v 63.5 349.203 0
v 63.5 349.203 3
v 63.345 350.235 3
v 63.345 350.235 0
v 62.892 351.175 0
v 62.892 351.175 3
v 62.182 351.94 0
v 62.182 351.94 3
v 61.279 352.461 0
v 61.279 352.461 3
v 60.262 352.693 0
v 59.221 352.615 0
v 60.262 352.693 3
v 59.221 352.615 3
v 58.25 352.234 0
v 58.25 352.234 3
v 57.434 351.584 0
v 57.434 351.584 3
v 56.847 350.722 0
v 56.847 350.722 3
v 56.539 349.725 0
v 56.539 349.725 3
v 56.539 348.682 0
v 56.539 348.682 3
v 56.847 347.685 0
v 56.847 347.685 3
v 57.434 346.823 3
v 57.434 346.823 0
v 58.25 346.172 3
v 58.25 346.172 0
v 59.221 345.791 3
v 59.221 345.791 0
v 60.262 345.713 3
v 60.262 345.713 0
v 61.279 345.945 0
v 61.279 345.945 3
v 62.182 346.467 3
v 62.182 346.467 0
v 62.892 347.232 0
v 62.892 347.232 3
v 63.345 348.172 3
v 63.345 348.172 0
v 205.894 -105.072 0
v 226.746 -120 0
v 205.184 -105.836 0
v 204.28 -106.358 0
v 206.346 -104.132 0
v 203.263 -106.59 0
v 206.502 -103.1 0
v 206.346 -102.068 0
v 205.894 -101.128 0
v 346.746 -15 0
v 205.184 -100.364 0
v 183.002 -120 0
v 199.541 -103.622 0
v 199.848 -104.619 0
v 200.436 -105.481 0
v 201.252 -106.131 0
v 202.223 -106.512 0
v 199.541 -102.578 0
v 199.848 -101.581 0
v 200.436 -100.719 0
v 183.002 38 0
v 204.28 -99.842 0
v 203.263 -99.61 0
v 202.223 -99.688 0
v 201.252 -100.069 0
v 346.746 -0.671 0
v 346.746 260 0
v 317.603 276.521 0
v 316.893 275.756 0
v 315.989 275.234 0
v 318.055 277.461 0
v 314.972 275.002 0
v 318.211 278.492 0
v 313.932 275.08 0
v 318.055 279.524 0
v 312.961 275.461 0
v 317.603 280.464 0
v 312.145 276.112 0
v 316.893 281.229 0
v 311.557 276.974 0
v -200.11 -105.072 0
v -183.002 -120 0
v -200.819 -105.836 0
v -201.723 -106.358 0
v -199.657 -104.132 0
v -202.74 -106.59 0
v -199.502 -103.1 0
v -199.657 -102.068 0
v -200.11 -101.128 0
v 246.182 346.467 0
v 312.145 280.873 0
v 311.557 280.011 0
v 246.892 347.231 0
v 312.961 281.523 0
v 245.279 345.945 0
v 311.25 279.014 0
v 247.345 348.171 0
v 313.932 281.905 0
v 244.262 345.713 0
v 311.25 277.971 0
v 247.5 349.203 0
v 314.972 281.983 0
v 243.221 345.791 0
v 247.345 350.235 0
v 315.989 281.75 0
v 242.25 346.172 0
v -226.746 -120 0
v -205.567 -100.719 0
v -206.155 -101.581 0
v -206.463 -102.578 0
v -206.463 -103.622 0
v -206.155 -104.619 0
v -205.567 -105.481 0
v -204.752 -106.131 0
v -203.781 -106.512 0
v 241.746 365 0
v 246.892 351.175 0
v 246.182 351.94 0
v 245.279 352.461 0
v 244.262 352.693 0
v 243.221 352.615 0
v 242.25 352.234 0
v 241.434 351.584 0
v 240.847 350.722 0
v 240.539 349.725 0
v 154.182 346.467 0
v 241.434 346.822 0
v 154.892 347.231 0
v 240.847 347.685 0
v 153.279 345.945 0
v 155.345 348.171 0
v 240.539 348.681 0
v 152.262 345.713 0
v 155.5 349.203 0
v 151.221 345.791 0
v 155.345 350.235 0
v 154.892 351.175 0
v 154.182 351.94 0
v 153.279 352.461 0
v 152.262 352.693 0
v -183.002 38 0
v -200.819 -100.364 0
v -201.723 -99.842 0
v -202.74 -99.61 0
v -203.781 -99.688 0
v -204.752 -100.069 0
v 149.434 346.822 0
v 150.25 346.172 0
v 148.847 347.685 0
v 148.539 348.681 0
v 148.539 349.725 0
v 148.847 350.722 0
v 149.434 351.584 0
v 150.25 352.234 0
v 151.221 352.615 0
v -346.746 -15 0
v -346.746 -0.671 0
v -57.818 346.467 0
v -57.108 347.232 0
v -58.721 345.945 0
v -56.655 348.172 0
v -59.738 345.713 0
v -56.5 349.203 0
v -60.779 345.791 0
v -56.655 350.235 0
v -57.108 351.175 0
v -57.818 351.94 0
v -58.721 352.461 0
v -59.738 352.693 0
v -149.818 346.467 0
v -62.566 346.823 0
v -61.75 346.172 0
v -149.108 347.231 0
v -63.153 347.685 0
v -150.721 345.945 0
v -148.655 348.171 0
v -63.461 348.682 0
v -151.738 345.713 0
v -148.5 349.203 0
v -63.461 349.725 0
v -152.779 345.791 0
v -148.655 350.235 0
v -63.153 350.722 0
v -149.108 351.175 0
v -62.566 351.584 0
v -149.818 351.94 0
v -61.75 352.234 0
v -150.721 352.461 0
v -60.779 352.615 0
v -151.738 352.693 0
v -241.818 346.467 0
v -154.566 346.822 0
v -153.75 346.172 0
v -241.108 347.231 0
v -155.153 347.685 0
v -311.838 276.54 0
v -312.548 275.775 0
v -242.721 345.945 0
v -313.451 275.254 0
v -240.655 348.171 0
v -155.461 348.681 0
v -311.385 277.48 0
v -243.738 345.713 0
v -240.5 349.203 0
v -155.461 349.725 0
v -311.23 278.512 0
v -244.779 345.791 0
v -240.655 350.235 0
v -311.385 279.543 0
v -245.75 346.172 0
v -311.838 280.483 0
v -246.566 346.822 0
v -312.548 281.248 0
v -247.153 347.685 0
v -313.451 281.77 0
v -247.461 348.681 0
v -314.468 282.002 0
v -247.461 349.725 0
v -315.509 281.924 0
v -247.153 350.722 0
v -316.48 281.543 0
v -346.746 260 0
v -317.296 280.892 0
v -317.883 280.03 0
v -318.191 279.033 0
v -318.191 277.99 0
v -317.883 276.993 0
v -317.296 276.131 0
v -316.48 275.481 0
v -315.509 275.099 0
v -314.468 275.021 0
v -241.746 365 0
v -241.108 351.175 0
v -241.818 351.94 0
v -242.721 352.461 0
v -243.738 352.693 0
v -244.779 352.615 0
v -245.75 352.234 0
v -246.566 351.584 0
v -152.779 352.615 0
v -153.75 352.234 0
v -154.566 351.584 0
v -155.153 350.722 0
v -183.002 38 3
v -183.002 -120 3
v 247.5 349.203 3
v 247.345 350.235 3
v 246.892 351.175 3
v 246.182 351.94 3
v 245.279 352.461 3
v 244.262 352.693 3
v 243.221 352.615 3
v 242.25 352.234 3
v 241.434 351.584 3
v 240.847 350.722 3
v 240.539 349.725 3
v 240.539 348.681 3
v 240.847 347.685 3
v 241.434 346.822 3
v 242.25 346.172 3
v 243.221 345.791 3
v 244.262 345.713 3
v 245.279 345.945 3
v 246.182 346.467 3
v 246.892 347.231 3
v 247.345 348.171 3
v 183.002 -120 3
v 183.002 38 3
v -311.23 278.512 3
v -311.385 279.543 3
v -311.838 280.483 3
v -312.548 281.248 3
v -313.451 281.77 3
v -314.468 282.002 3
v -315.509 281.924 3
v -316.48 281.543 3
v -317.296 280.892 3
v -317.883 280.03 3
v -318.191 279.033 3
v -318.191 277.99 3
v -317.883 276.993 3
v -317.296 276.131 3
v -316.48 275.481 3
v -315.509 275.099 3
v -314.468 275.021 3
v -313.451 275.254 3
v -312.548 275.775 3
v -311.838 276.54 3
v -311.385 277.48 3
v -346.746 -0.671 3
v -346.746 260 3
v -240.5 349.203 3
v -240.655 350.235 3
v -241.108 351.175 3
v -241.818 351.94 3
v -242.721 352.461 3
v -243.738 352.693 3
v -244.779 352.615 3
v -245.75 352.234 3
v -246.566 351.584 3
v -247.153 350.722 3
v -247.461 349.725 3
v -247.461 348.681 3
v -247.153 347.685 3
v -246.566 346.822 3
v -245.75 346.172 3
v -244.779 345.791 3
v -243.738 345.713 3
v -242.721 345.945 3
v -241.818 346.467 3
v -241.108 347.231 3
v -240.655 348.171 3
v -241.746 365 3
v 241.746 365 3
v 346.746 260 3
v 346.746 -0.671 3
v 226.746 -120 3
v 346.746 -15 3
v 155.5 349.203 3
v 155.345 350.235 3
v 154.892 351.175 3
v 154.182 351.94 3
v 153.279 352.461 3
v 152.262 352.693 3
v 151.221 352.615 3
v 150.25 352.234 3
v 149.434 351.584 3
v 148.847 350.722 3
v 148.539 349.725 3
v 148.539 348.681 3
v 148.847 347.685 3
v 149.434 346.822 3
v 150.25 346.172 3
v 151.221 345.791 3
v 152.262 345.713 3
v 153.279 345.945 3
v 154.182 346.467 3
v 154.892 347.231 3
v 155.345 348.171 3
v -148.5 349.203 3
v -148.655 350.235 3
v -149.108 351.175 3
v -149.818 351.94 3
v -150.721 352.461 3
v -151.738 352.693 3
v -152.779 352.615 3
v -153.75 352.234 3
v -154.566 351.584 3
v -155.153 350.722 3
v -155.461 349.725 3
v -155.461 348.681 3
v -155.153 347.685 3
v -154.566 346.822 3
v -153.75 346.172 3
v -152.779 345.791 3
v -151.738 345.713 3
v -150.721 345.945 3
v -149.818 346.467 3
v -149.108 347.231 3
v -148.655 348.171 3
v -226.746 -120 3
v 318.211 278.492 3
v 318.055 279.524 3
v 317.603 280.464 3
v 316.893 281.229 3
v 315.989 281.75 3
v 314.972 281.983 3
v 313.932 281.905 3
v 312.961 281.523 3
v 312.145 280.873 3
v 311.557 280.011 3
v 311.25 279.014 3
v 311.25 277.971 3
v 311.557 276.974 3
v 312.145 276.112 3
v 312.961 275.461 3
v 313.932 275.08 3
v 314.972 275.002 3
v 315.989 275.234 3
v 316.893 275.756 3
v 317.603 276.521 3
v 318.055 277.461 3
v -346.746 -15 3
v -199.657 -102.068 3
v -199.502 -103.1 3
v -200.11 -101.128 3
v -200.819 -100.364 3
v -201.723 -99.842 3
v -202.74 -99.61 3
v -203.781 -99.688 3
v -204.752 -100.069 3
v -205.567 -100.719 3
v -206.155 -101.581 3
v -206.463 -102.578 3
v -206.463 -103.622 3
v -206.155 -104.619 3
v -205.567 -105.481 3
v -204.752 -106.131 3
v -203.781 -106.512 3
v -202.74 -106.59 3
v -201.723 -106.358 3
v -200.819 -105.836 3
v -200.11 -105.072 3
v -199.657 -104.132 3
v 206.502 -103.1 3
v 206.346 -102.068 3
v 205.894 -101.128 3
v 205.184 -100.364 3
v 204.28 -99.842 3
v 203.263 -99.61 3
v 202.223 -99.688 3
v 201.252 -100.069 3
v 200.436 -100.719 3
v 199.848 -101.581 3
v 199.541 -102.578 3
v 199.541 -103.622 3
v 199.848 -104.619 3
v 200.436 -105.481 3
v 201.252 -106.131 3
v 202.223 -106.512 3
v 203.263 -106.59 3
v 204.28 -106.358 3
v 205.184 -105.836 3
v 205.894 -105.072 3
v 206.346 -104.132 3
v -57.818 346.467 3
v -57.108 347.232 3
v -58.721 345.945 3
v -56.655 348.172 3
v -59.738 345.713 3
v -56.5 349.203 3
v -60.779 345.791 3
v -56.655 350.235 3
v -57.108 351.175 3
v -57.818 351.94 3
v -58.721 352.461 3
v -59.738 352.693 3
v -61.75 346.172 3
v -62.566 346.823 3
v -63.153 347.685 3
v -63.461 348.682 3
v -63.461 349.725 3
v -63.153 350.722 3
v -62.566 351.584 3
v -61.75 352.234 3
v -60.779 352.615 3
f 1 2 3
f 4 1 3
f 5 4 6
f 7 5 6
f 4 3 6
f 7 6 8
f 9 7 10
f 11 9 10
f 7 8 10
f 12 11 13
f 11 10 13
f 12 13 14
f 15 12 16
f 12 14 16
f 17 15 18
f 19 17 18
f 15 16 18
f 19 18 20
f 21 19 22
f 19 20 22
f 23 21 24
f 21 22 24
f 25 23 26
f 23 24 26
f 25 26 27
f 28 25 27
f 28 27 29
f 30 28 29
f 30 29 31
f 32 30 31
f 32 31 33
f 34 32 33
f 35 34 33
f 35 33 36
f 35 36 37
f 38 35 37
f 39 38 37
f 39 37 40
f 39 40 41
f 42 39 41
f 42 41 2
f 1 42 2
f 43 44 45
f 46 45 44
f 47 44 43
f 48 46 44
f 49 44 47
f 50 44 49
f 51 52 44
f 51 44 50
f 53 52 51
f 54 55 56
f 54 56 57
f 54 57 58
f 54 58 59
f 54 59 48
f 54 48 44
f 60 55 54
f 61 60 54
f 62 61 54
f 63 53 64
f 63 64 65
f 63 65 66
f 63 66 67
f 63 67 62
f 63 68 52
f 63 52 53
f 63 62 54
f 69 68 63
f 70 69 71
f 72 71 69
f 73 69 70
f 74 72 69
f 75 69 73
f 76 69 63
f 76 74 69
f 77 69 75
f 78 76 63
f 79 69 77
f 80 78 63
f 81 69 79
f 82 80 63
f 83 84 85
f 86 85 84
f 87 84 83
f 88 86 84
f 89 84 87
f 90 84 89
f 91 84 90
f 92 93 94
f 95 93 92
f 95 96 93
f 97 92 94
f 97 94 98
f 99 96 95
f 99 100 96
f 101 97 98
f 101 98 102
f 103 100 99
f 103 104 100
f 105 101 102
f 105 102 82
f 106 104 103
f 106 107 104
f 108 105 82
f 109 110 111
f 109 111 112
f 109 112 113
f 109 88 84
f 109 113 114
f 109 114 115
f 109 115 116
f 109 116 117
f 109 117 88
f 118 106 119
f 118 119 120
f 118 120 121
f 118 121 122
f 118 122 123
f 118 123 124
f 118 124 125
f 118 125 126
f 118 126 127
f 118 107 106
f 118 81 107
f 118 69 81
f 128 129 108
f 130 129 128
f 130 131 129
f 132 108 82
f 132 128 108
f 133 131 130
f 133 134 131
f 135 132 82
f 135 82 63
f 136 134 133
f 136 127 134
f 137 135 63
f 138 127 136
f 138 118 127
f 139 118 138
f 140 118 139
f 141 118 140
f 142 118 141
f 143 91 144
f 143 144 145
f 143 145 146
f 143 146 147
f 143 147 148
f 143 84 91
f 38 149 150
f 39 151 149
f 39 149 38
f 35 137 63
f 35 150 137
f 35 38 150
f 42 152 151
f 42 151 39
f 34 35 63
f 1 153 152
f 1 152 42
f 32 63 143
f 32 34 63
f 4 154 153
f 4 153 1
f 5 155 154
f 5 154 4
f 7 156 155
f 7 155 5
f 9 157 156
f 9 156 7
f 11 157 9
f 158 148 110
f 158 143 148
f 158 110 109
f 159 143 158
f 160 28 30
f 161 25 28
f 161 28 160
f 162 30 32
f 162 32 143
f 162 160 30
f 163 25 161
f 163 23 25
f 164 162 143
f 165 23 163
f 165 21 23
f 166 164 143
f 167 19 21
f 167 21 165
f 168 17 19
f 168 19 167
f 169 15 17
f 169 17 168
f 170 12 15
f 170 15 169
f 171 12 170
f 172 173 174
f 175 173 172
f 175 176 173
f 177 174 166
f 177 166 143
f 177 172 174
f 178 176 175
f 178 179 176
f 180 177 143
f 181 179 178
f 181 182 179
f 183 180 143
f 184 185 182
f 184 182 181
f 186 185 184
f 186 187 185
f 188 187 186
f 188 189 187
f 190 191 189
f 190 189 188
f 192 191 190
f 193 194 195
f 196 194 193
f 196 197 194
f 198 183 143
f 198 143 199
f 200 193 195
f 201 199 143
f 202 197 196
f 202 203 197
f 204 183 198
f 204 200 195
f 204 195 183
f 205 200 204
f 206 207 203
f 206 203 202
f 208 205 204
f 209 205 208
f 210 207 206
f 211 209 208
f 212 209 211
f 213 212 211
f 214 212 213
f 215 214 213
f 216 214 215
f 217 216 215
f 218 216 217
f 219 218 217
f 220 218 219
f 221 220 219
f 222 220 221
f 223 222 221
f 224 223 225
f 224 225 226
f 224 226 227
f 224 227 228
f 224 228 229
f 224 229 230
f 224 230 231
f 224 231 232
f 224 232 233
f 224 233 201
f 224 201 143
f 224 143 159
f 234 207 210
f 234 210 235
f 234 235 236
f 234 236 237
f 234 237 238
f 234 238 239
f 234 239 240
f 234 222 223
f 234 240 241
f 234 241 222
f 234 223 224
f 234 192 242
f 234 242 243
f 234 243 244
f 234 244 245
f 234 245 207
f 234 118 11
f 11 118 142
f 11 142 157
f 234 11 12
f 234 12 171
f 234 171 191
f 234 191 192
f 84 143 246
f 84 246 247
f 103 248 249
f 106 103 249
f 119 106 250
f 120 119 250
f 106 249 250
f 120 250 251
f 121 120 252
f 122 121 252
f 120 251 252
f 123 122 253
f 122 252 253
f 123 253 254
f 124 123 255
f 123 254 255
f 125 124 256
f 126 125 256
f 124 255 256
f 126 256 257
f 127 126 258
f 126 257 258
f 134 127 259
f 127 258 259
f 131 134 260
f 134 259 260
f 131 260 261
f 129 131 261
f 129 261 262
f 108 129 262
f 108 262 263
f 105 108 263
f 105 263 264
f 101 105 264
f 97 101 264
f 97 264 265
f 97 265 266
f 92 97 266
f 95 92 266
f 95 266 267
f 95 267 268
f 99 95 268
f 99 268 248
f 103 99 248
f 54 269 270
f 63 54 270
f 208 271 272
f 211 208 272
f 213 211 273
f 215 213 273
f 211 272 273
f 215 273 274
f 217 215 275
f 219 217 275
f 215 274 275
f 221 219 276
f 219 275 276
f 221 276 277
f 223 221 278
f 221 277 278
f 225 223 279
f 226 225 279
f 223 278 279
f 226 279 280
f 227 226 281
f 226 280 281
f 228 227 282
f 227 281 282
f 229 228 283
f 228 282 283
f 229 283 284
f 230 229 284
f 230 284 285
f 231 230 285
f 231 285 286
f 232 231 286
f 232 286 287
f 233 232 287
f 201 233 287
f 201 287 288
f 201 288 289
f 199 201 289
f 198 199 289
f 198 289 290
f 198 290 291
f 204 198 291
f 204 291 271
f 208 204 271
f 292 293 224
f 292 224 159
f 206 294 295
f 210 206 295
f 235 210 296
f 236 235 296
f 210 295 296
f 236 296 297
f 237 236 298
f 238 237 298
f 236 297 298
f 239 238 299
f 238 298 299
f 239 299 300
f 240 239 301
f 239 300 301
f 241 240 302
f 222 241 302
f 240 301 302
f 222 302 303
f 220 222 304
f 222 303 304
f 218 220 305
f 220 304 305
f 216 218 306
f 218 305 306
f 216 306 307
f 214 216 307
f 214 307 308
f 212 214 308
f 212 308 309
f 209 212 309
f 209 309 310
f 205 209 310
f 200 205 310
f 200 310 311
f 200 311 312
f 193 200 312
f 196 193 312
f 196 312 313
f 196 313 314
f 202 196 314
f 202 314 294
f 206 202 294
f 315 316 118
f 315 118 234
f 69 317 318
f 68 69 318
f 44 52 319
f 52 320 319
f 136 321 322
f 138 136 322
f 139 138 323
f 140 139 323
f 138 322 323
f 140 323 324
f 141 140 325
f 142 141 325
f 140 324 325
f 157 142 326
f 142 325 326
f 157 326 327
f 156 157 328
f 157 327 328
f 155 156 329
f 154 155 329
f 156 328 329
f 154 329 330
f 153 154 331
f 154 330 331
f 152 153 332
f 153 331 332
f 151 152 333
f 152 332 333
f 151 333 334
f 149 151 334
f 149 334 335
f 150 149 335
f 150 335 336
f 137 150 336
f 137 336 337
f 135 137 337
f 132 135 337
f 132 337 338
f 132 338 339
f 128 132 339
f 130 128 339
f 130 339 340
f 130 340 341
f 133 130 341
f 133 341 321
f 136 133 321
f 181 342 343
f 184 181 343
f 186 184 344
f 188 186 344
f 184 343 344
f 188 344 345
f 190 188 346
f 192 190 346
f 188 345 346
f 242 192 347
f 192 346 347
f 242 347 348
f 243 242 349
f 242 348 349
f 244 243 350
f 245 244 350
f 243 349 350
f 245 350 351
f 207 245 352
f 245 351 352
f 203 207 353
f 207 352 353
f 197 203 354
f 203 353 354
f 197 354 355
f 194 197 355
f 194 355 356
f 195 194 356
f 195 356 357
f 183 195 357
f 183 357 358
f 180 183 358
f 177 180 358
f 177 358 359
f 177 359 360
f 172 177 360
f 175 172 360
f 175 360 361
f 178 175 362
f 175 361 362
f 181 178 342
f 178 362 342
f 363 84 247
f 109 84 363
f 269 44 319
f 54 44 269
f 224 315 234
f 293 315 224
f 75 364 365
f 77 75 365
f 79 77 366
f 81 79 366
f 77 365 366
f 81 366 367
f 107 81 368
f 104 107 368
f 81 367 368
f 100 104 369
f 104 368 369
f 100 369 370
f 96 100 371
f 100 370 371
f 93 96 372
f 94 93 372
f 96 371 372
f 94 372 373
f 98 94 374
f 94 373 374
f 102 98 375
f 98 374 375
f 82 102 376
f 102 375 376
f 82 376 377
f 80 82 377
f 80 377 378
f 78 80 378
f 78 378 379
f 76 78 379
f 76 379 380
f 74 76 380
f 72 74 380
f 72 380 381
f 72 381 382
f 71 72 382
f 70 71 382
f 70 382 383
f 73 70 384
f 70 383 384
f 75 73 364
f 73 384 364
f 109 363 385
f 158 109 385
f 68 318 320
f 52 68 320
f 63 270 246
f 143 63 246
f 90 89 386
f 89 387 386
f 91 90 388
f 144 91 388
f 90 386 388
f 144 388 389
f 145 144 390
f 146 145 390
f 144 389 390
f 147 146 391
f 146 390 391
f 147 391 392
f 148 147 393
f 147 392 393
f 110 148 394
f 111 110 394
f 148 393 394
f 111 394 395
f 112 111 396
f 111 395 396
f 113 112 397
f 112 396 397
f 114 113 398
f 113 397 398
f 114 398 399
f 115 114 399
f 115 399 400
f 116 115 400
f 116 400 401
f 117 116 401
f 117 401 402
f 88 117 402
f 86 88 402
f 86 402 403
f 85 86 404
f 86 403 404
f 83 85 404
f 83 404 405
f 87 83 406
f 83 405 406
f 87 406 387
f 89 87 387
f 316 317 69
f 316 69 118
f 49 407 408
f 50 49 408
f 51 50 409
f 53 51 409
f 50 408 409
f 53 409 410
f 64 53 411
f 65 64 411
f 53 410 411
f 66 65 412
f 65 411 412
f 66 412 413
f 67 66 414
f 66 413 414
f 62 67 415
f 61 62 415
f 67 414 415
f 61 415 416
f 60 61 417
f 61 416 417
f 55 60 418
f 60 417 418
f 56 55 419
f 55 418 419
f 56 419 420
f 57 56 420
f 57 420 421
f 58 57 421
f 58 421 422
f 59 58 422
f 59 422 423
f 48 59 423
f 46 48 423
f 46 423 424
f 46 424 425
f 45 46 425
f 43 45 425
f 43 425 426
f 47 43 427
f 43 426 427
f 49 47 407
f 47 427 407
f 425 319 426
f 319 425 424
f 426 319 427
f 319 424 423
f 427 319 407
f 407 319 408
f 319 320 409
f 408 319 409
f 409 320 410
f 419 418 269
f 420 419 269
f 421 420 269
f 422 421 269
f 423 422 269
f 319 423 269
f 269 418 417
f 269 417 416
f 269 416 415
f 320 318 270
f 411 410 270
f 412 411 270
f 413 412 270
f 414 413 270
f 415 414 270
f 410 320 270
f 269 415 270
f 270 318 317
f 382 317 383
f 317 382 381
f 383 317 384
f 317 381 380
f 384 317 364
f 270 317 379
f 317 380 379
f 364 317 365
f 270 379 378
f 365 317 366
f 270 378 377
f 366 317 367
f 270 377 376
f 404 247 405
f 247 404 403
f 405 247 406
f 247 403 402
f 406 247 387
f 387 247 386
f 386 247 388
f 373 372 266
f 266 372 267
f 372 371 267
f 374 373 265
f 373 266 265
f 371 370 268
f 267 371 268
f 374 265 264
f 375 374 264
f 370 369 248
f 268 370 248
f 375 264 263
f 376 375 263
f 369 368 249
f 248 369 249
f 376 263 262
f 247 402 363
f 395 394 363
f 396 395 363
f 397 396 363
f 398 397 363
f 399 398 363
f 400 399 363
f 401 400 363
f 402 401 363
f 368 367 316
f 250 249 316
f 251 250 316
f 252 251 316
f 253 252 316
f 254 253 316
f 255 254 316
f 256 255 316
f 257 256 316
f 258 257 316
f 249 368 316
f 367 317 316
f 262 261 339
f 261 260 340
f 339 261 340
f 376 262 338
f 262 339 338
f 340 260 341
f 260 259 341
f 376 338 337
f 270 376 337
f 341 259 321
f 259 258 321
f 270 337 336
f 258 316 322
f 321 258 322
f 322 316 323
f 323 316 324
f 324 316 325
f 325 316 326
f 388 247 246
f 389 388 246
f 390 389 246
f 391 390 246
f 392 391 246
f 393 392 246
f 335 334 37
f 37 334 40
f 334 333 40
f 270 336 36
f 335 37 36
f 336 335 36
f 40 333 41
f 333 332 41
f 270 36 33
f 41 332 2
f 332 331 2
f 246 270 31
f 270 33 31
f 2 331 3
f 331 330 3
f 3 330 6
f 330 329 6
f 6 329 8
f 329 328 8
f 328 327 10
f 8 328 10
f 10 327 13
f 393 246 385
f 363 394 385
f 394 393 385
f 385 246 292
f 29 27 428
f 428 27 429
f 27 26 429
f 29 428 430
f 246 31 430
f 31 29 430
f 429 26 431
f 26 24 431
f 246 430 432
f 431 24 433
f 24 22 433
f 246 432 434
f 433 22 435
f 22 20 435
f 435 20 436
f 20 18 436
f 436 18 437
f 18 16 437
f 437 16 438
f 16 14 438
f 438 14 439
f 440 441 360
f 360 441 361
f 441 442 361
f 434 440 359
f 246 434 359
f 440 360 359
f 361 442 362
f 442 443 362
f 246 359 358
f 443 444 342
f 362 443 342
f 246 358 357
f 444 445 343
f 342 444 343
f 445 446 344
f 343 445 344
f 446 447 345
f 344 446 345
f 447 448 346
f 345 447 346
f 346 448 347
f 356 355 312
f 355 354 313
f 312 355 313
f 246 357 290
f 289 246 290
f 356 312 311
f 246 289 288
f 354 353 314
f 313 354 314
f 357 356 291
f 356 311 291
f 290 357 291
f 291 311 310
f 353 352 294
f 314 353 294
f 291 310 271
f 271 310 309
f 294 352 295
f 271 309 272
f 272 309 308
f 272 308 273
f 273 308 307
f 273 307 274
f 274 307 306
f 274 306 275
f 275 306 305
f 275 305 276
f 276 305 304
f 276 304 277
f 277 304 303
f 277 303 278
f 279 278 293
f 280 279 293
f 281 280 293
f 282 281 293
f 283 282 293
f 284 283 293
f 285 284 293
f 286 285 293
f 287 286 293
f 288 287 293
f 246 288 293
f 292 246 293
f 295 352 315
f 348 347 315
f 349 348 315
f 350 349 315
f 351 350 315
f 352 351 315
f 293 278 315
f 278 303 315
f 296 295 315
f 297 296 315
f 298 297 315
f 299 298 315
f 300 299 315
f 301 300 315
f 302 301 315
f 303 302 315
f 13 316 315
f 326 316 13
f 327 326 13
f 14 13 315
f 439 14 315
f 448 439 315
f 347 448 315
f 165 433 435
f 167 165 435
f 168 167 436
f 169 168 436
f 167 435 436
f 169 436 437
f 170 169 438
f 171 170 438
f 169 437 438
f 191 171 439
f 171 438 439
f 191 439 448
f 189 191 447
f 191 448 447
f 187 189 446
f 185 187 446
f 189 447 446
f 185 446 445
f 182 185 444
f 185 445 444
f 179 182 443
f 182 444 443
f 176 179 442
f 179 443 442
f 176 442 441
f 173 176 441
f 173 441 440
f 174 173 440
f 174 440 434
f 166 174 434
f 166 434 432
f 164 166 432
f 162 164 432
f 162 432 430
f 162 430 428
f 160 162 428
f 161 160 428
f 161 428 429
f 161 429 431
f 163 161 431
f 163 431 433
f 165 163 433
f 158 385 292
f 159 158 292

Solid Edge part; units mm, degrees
sketch "Sketch1" plane through (0, 0, 0) normal (0, 0, 1) x (1, 0, 0)
  line L0 (-183.0017, -120) -> (-227.4217, -120)
  line L1 (-289.5811, -57.8353) -> (-227.4217, -120)
  line L2 (-289.5811, -57.8353) -> (-351.7458, 4.3295)
  line L3 (-351.7458, 129.7437) -> (-351.7458, 4.3295)
  line L4 (-351.7458, 129.7437) -> (-351.7458, 255.1579)
  line L5 (-289.4346, 317.4691) -> (-351.7458, 255.1579)
  line L6 (-289.4346, 317.4691) -> (-227.7006, 379.2031)
  line L7 (0, 379.2031) -> (-227.7006, 379.2031)
  line L8 (0, 379.2031) -> (0, 0)
  line L9 (0, 0) -> (-183.0017, 0)
  line L10 (-183.0017, 0) -> (-183.0017, -120)
  dimension "D1" = 351.7458
  dimension "D2" = 227.7006
  dimension "D3" = 120
  dimension "D4" = 44.42
  dimension "D5" = 87.3051
  dimension "D6" = 88.1213
  dimension "D7" = 125.4142
  dimension "D8" = 125.4142
  dimension "D9" = 87.9142
  dimension "D10" = 87.9104
  dimension "D11" = 499.2031
extrude "Protrusion1" add sketch "Sketch1" along normal blind 3
mirror "Mirror1" about plane through (0, 0, 0) normal (1, 0, 0) of "Protrusion1"
sketch "Sketch2" plane through (0, 149.6016, 0) normal (0, 0, -1) x (-1, 0, 0)
  line L0 (-351.7458, -111.1142) -> (-193.1203, -269.6016)
  line L1 (-193.1203, -269.6016) -> (-227.4217, -269.6016)
  arc A0 (-351.7458, -145.2721) -> (-227.4217, -269.6016) centre (-220.2414, -138.0974) ccw
  line L2 (-351.7458, -111.1142) -> (-351.7458, -145.2721)
  dimension "D1" = 131.7
extrude "Protrusion2" add sketch "Sketch2" against normal up to vertex (3 mm away)
sketch "Sketch3" plane through (0, 149.6016, 0) normal (0, 0, -1) x (-1, 0, 0)
  line L0 (-227.7006, 229.6016) -> (-351.7458, 105.5563)
  arc A0 (-351.7458, 105.5563) -> (-227.7006, 229.6016) centre (-220.2564, 98.1121) cw
extrude "Protrusion3" add sketch "Sketch3" against normal up to vertex (3 mm away)
mirror "Mirror2" about plane through (0, 0, 0) normal (1, 0, 0) of "Protrusion3", "Protrusion2"
sketch "Sketch4" plane through (0, 0, 2.5) normal (0, -1, 0) x (1, 0, 0)
  line L0 (-183.0017, 0.5) -> (183.0017, 0.5)
  line L1 (183.0017, 0.5) -> (183.0017, -2.5)
  line L2 (183.0017, -2.5) -> (-183.0017, -2.5)
  line L3 (-183.0017, -2.5) -> (-183.0017, 0.5)
extrude "Protrusion6" add sketch "Sketch4" along normal blind 1.13
sketch "Sketch5" plane through (0, 129.6016, 3) normal (0, 0, 1) x (1, 0, 0)
  line L0 (-183.0017, -130.7316) -> (183.0017, -130.7316)
  line L1 (183.0017, -130.7316) -> (183.0017, -115.7316)
  line L2 (183.0017, -115.7316) -> (-183.0017, -115.7316)
  line L3 (-183.0017, -115.7316) -> (-183.0017, -130.7316)
  dimension "D1" = 15
extrude "Cutout1" cut sketch "Sketch5" against normal through all
sketch "Sketch6" plane through (0, 129.6016, 3) normal (0, 0, 1) x (1, 0, 0)
  circle A0 centre (-203.0017, -232.7016) radius 3.5
  circle A1 centre (203.0017, -232.7016) radius 3.5
  dimension "D1" = 7
  dimension "D2" = 20
  dimension "D3" = 16.9
extrude "Cutout2" cut sketch "Sketch6" against normal through all
sketch "Sketch7" plane through (0, 129.6016, 3) normal (0, 0, 1) x (1, 0, 0)
  circle A0 centre (-60, 219.6016) radius 3.5
  circle A1 centre (60, 219.6016) radius 3.5
  dimension "D1" = 120
  dimension "D2" = 7
  dimension "D3" = 30
extrude "Cutout3" cut sketch "Sketch7" against normal through all
sketch "Sketch8" plane through (0, 129.6016, 3) normal (0, 0, 1) x (1, 0, 0)
  line L0 (-351.7458, 125.5563) -> (-227.7006, 249.6016)
  line L1 (-227.7006, 249.6016) -> (-363.4952, 305.1732)
  line L2 (-363.4952, 305.1732) -> (-448.4916, 154.169)
  line L3 (-448.4916, 154.169) -> (-351.7458, 125.5563)
  line L4 (227.7006, 249.6016) -> (351.7458, 125.5563)
  line L5 (451.8618, 235.0605) -> (351.7458, 125.5563)
  line L6 (265.8398, 326.8744) -> (451.8618, 235.0605)
  line L7 (227.7006, 249.6016) -> (265.8398, 326.8744)
  line L8 (-351.7458, -125.2721) -> (-227.4217, -249.6016)
  line L9 (-294.7747, -355.8094) -> (-227.4217, -249.6016)
  line L10 (-435.8326, -227.4106) -> (-294.7747, -355.8094)
  line L11 (-351.7458, -125.2721) -> (-435.8326, -227.4106)
  line L12 (227.4217, -249.6016) -> (351.7458, -125.2721)
  line L13 (351.7458, -125.2721) -> (481.0434, -232.7016)
  line L14 (481.0434, -232.7016) -> (340.8898, -317.8323)
  line L15 (340.8898, -317.8323) -> (227.4217, -249.6016)
extrude "Cutout4" cut sketch "Sketch8" against normal through all
sketch "Sketch9" plane through (0, 129.6016, 3) normal (0, 0, 1) x (1, 0, 0)
  line L0 (-241.9037, 279.2919) -> (241.9037, 279.2919)
  line L1 (241.9037, 279.2919) -> (241.9037, 235.3984)
  line L2 (241.9037, 235.3984) -> (-241.9037, 235.3984)
  line L3 (-241.9037, 235.3984) -> (-241.9037, 279.2919)
  dimension "D1" = 485
extrude "Cutout5" cut sketch "Sketch9" against normal through all
sketch "Sketch10" plane through (0, 122.5, 3) normal (0, 0, 1) x (1, 0, 0)
  circle A0 centre (-314.7299, 156.0117) radius 3.5
  circle A1 centre (-152, 226.7031) radius 3.5
  circle A2 centre (152, 226.7031) radius 3.5
  circle A3 centre (244, 226.7031) radius 3.5
  circle A4 centre (314.7107, 155.9924) radius 3.5
  circle A5 centre (-244, 226.7031) radius 3.5
  dimension "D1" = 100
  dimension "D2" = 9.6701
  dimension "D3" = 184
extrude "Cutout6" cut sketch "Sketch10" against normal through all
sketch "Sketch11" plane through (0, 122.5, 3) normal (0, 0, 1) x (1, 0, 0)
  line L0 (-346.7458, -123.1707) -> (-389.0462, -123.1707)
  line L1 (-389.0462, -123.1707) -> (-389.0462, 137.6579)
  line L2 (-389.0462, 137.6579) -> (-346.7458, 137.6579)
  line L3 (-346.7458, 137.6579) -> (-346.7458, -123.1707)
  line L4 (346.7458, -123.1707) -> (391.6035, -123.1707)
  line L5 (391.6035, -123.1707) -> (391.6035, 137.6579)
  line L6 (391.6035, 137.6579) -> (346.7458, 137.6579)
  line L7 (346.7458, 137.6579) -> (346.7458, -123.1707)
  dimension "D1" = 5
  dimension "D2" = 5
extrude "Cutout7" cut sketch "Sketch11" against normal through all
sketch "Sketch12" plane through (0, 122.5, 3) normal (0, 0, 1) x (1, 0, 0)
  line L0 (-183.0017, -108.63) -> (183.0017, -108.63)
  line L1 (183.0017, -108.63) -> (183.0017, -84.5)
  line L2 (183.0017, -84.5) -> (-183.0017, -84.5)
  line L3 (-183.0017, -84.5) -> (-183.0017, -108.63)
  dimension "D1" = 158
extrude "Cutout8" cut sketch "Sketch12" against normal through all
sketch "Sketch13" plane through (0, 122.5, 3) normal (0, 0, 1) x (1, 0, 0)
  line L0 (-227.4217, -242.5) -> (-346.7458, -138.1707)
  line L1 (-346.7458, -138.1707) -> (-346.7458, -123.1707)
  line L2 (-346.7458, -123.1707) -> (-227.4217, -242.5)
  line L3 (227.4217, -242.5) -> (346.7458, -123.1707)
  line L4 (346.7458, -123.1707) -> (346.7458, -138.1707)
  line L5 (346.7458, -138.1707) -> (227.4217, -242.5)
  dimension "D1" = 15
  dimension "D2" = 15
extrude "Protrusion7" add sketch "Sketch13" against normal up to vertex (3 mm away)
sketch "Sketch14" plane through (0, 122.5, 3) normal (0, 0, 1) x (1, 0, 0)
  line L0 (-241.7458, 242.5) -> (-346.7458, 137.5)
  line L1 (-346.7458, 137.5) -> (-371.6237, 169.0493)
  line L2 (-371.6237, 169.0493) -> (-268.0776, 273.8459)
  line L3 (-268.0776, 273.8459) -> (-241.7458, 242.5)
  dimension "D1" = 105
extrude "Cutout9" cut sketch "Sketch14" against normal through all
mirror "Mirror3" about plane through (0, 0, 0) normal (1, 0, 0) of "Cutout9"
sketch "Sketch15" plane through (0, 122.5, 3) normal (0, 0, 1) x (1, 0, 0)
  line L0 (-226.7458, -242.5) -> (-346.7458, -137.5)
  line L1 (-346.7458, -137.5) -> (-366.1295, -195.1398)
  line L2 (-366.1295, -195.1398) -> (-252.7979, -291.374)
  line L3 (-252.7979, -291.374) -> (-226.7458, -242.5)
  dimension "D1" = 105
  dimension "D2" = 120
extrude "Cutout10" cut sketch "Sketch15" against normal through all
mirror "Mirror4" about plane through (0, 0, 0) normal (1, 0, 0) of "Cutout10"
properties material "ABS-Plastik, mittelfest"
